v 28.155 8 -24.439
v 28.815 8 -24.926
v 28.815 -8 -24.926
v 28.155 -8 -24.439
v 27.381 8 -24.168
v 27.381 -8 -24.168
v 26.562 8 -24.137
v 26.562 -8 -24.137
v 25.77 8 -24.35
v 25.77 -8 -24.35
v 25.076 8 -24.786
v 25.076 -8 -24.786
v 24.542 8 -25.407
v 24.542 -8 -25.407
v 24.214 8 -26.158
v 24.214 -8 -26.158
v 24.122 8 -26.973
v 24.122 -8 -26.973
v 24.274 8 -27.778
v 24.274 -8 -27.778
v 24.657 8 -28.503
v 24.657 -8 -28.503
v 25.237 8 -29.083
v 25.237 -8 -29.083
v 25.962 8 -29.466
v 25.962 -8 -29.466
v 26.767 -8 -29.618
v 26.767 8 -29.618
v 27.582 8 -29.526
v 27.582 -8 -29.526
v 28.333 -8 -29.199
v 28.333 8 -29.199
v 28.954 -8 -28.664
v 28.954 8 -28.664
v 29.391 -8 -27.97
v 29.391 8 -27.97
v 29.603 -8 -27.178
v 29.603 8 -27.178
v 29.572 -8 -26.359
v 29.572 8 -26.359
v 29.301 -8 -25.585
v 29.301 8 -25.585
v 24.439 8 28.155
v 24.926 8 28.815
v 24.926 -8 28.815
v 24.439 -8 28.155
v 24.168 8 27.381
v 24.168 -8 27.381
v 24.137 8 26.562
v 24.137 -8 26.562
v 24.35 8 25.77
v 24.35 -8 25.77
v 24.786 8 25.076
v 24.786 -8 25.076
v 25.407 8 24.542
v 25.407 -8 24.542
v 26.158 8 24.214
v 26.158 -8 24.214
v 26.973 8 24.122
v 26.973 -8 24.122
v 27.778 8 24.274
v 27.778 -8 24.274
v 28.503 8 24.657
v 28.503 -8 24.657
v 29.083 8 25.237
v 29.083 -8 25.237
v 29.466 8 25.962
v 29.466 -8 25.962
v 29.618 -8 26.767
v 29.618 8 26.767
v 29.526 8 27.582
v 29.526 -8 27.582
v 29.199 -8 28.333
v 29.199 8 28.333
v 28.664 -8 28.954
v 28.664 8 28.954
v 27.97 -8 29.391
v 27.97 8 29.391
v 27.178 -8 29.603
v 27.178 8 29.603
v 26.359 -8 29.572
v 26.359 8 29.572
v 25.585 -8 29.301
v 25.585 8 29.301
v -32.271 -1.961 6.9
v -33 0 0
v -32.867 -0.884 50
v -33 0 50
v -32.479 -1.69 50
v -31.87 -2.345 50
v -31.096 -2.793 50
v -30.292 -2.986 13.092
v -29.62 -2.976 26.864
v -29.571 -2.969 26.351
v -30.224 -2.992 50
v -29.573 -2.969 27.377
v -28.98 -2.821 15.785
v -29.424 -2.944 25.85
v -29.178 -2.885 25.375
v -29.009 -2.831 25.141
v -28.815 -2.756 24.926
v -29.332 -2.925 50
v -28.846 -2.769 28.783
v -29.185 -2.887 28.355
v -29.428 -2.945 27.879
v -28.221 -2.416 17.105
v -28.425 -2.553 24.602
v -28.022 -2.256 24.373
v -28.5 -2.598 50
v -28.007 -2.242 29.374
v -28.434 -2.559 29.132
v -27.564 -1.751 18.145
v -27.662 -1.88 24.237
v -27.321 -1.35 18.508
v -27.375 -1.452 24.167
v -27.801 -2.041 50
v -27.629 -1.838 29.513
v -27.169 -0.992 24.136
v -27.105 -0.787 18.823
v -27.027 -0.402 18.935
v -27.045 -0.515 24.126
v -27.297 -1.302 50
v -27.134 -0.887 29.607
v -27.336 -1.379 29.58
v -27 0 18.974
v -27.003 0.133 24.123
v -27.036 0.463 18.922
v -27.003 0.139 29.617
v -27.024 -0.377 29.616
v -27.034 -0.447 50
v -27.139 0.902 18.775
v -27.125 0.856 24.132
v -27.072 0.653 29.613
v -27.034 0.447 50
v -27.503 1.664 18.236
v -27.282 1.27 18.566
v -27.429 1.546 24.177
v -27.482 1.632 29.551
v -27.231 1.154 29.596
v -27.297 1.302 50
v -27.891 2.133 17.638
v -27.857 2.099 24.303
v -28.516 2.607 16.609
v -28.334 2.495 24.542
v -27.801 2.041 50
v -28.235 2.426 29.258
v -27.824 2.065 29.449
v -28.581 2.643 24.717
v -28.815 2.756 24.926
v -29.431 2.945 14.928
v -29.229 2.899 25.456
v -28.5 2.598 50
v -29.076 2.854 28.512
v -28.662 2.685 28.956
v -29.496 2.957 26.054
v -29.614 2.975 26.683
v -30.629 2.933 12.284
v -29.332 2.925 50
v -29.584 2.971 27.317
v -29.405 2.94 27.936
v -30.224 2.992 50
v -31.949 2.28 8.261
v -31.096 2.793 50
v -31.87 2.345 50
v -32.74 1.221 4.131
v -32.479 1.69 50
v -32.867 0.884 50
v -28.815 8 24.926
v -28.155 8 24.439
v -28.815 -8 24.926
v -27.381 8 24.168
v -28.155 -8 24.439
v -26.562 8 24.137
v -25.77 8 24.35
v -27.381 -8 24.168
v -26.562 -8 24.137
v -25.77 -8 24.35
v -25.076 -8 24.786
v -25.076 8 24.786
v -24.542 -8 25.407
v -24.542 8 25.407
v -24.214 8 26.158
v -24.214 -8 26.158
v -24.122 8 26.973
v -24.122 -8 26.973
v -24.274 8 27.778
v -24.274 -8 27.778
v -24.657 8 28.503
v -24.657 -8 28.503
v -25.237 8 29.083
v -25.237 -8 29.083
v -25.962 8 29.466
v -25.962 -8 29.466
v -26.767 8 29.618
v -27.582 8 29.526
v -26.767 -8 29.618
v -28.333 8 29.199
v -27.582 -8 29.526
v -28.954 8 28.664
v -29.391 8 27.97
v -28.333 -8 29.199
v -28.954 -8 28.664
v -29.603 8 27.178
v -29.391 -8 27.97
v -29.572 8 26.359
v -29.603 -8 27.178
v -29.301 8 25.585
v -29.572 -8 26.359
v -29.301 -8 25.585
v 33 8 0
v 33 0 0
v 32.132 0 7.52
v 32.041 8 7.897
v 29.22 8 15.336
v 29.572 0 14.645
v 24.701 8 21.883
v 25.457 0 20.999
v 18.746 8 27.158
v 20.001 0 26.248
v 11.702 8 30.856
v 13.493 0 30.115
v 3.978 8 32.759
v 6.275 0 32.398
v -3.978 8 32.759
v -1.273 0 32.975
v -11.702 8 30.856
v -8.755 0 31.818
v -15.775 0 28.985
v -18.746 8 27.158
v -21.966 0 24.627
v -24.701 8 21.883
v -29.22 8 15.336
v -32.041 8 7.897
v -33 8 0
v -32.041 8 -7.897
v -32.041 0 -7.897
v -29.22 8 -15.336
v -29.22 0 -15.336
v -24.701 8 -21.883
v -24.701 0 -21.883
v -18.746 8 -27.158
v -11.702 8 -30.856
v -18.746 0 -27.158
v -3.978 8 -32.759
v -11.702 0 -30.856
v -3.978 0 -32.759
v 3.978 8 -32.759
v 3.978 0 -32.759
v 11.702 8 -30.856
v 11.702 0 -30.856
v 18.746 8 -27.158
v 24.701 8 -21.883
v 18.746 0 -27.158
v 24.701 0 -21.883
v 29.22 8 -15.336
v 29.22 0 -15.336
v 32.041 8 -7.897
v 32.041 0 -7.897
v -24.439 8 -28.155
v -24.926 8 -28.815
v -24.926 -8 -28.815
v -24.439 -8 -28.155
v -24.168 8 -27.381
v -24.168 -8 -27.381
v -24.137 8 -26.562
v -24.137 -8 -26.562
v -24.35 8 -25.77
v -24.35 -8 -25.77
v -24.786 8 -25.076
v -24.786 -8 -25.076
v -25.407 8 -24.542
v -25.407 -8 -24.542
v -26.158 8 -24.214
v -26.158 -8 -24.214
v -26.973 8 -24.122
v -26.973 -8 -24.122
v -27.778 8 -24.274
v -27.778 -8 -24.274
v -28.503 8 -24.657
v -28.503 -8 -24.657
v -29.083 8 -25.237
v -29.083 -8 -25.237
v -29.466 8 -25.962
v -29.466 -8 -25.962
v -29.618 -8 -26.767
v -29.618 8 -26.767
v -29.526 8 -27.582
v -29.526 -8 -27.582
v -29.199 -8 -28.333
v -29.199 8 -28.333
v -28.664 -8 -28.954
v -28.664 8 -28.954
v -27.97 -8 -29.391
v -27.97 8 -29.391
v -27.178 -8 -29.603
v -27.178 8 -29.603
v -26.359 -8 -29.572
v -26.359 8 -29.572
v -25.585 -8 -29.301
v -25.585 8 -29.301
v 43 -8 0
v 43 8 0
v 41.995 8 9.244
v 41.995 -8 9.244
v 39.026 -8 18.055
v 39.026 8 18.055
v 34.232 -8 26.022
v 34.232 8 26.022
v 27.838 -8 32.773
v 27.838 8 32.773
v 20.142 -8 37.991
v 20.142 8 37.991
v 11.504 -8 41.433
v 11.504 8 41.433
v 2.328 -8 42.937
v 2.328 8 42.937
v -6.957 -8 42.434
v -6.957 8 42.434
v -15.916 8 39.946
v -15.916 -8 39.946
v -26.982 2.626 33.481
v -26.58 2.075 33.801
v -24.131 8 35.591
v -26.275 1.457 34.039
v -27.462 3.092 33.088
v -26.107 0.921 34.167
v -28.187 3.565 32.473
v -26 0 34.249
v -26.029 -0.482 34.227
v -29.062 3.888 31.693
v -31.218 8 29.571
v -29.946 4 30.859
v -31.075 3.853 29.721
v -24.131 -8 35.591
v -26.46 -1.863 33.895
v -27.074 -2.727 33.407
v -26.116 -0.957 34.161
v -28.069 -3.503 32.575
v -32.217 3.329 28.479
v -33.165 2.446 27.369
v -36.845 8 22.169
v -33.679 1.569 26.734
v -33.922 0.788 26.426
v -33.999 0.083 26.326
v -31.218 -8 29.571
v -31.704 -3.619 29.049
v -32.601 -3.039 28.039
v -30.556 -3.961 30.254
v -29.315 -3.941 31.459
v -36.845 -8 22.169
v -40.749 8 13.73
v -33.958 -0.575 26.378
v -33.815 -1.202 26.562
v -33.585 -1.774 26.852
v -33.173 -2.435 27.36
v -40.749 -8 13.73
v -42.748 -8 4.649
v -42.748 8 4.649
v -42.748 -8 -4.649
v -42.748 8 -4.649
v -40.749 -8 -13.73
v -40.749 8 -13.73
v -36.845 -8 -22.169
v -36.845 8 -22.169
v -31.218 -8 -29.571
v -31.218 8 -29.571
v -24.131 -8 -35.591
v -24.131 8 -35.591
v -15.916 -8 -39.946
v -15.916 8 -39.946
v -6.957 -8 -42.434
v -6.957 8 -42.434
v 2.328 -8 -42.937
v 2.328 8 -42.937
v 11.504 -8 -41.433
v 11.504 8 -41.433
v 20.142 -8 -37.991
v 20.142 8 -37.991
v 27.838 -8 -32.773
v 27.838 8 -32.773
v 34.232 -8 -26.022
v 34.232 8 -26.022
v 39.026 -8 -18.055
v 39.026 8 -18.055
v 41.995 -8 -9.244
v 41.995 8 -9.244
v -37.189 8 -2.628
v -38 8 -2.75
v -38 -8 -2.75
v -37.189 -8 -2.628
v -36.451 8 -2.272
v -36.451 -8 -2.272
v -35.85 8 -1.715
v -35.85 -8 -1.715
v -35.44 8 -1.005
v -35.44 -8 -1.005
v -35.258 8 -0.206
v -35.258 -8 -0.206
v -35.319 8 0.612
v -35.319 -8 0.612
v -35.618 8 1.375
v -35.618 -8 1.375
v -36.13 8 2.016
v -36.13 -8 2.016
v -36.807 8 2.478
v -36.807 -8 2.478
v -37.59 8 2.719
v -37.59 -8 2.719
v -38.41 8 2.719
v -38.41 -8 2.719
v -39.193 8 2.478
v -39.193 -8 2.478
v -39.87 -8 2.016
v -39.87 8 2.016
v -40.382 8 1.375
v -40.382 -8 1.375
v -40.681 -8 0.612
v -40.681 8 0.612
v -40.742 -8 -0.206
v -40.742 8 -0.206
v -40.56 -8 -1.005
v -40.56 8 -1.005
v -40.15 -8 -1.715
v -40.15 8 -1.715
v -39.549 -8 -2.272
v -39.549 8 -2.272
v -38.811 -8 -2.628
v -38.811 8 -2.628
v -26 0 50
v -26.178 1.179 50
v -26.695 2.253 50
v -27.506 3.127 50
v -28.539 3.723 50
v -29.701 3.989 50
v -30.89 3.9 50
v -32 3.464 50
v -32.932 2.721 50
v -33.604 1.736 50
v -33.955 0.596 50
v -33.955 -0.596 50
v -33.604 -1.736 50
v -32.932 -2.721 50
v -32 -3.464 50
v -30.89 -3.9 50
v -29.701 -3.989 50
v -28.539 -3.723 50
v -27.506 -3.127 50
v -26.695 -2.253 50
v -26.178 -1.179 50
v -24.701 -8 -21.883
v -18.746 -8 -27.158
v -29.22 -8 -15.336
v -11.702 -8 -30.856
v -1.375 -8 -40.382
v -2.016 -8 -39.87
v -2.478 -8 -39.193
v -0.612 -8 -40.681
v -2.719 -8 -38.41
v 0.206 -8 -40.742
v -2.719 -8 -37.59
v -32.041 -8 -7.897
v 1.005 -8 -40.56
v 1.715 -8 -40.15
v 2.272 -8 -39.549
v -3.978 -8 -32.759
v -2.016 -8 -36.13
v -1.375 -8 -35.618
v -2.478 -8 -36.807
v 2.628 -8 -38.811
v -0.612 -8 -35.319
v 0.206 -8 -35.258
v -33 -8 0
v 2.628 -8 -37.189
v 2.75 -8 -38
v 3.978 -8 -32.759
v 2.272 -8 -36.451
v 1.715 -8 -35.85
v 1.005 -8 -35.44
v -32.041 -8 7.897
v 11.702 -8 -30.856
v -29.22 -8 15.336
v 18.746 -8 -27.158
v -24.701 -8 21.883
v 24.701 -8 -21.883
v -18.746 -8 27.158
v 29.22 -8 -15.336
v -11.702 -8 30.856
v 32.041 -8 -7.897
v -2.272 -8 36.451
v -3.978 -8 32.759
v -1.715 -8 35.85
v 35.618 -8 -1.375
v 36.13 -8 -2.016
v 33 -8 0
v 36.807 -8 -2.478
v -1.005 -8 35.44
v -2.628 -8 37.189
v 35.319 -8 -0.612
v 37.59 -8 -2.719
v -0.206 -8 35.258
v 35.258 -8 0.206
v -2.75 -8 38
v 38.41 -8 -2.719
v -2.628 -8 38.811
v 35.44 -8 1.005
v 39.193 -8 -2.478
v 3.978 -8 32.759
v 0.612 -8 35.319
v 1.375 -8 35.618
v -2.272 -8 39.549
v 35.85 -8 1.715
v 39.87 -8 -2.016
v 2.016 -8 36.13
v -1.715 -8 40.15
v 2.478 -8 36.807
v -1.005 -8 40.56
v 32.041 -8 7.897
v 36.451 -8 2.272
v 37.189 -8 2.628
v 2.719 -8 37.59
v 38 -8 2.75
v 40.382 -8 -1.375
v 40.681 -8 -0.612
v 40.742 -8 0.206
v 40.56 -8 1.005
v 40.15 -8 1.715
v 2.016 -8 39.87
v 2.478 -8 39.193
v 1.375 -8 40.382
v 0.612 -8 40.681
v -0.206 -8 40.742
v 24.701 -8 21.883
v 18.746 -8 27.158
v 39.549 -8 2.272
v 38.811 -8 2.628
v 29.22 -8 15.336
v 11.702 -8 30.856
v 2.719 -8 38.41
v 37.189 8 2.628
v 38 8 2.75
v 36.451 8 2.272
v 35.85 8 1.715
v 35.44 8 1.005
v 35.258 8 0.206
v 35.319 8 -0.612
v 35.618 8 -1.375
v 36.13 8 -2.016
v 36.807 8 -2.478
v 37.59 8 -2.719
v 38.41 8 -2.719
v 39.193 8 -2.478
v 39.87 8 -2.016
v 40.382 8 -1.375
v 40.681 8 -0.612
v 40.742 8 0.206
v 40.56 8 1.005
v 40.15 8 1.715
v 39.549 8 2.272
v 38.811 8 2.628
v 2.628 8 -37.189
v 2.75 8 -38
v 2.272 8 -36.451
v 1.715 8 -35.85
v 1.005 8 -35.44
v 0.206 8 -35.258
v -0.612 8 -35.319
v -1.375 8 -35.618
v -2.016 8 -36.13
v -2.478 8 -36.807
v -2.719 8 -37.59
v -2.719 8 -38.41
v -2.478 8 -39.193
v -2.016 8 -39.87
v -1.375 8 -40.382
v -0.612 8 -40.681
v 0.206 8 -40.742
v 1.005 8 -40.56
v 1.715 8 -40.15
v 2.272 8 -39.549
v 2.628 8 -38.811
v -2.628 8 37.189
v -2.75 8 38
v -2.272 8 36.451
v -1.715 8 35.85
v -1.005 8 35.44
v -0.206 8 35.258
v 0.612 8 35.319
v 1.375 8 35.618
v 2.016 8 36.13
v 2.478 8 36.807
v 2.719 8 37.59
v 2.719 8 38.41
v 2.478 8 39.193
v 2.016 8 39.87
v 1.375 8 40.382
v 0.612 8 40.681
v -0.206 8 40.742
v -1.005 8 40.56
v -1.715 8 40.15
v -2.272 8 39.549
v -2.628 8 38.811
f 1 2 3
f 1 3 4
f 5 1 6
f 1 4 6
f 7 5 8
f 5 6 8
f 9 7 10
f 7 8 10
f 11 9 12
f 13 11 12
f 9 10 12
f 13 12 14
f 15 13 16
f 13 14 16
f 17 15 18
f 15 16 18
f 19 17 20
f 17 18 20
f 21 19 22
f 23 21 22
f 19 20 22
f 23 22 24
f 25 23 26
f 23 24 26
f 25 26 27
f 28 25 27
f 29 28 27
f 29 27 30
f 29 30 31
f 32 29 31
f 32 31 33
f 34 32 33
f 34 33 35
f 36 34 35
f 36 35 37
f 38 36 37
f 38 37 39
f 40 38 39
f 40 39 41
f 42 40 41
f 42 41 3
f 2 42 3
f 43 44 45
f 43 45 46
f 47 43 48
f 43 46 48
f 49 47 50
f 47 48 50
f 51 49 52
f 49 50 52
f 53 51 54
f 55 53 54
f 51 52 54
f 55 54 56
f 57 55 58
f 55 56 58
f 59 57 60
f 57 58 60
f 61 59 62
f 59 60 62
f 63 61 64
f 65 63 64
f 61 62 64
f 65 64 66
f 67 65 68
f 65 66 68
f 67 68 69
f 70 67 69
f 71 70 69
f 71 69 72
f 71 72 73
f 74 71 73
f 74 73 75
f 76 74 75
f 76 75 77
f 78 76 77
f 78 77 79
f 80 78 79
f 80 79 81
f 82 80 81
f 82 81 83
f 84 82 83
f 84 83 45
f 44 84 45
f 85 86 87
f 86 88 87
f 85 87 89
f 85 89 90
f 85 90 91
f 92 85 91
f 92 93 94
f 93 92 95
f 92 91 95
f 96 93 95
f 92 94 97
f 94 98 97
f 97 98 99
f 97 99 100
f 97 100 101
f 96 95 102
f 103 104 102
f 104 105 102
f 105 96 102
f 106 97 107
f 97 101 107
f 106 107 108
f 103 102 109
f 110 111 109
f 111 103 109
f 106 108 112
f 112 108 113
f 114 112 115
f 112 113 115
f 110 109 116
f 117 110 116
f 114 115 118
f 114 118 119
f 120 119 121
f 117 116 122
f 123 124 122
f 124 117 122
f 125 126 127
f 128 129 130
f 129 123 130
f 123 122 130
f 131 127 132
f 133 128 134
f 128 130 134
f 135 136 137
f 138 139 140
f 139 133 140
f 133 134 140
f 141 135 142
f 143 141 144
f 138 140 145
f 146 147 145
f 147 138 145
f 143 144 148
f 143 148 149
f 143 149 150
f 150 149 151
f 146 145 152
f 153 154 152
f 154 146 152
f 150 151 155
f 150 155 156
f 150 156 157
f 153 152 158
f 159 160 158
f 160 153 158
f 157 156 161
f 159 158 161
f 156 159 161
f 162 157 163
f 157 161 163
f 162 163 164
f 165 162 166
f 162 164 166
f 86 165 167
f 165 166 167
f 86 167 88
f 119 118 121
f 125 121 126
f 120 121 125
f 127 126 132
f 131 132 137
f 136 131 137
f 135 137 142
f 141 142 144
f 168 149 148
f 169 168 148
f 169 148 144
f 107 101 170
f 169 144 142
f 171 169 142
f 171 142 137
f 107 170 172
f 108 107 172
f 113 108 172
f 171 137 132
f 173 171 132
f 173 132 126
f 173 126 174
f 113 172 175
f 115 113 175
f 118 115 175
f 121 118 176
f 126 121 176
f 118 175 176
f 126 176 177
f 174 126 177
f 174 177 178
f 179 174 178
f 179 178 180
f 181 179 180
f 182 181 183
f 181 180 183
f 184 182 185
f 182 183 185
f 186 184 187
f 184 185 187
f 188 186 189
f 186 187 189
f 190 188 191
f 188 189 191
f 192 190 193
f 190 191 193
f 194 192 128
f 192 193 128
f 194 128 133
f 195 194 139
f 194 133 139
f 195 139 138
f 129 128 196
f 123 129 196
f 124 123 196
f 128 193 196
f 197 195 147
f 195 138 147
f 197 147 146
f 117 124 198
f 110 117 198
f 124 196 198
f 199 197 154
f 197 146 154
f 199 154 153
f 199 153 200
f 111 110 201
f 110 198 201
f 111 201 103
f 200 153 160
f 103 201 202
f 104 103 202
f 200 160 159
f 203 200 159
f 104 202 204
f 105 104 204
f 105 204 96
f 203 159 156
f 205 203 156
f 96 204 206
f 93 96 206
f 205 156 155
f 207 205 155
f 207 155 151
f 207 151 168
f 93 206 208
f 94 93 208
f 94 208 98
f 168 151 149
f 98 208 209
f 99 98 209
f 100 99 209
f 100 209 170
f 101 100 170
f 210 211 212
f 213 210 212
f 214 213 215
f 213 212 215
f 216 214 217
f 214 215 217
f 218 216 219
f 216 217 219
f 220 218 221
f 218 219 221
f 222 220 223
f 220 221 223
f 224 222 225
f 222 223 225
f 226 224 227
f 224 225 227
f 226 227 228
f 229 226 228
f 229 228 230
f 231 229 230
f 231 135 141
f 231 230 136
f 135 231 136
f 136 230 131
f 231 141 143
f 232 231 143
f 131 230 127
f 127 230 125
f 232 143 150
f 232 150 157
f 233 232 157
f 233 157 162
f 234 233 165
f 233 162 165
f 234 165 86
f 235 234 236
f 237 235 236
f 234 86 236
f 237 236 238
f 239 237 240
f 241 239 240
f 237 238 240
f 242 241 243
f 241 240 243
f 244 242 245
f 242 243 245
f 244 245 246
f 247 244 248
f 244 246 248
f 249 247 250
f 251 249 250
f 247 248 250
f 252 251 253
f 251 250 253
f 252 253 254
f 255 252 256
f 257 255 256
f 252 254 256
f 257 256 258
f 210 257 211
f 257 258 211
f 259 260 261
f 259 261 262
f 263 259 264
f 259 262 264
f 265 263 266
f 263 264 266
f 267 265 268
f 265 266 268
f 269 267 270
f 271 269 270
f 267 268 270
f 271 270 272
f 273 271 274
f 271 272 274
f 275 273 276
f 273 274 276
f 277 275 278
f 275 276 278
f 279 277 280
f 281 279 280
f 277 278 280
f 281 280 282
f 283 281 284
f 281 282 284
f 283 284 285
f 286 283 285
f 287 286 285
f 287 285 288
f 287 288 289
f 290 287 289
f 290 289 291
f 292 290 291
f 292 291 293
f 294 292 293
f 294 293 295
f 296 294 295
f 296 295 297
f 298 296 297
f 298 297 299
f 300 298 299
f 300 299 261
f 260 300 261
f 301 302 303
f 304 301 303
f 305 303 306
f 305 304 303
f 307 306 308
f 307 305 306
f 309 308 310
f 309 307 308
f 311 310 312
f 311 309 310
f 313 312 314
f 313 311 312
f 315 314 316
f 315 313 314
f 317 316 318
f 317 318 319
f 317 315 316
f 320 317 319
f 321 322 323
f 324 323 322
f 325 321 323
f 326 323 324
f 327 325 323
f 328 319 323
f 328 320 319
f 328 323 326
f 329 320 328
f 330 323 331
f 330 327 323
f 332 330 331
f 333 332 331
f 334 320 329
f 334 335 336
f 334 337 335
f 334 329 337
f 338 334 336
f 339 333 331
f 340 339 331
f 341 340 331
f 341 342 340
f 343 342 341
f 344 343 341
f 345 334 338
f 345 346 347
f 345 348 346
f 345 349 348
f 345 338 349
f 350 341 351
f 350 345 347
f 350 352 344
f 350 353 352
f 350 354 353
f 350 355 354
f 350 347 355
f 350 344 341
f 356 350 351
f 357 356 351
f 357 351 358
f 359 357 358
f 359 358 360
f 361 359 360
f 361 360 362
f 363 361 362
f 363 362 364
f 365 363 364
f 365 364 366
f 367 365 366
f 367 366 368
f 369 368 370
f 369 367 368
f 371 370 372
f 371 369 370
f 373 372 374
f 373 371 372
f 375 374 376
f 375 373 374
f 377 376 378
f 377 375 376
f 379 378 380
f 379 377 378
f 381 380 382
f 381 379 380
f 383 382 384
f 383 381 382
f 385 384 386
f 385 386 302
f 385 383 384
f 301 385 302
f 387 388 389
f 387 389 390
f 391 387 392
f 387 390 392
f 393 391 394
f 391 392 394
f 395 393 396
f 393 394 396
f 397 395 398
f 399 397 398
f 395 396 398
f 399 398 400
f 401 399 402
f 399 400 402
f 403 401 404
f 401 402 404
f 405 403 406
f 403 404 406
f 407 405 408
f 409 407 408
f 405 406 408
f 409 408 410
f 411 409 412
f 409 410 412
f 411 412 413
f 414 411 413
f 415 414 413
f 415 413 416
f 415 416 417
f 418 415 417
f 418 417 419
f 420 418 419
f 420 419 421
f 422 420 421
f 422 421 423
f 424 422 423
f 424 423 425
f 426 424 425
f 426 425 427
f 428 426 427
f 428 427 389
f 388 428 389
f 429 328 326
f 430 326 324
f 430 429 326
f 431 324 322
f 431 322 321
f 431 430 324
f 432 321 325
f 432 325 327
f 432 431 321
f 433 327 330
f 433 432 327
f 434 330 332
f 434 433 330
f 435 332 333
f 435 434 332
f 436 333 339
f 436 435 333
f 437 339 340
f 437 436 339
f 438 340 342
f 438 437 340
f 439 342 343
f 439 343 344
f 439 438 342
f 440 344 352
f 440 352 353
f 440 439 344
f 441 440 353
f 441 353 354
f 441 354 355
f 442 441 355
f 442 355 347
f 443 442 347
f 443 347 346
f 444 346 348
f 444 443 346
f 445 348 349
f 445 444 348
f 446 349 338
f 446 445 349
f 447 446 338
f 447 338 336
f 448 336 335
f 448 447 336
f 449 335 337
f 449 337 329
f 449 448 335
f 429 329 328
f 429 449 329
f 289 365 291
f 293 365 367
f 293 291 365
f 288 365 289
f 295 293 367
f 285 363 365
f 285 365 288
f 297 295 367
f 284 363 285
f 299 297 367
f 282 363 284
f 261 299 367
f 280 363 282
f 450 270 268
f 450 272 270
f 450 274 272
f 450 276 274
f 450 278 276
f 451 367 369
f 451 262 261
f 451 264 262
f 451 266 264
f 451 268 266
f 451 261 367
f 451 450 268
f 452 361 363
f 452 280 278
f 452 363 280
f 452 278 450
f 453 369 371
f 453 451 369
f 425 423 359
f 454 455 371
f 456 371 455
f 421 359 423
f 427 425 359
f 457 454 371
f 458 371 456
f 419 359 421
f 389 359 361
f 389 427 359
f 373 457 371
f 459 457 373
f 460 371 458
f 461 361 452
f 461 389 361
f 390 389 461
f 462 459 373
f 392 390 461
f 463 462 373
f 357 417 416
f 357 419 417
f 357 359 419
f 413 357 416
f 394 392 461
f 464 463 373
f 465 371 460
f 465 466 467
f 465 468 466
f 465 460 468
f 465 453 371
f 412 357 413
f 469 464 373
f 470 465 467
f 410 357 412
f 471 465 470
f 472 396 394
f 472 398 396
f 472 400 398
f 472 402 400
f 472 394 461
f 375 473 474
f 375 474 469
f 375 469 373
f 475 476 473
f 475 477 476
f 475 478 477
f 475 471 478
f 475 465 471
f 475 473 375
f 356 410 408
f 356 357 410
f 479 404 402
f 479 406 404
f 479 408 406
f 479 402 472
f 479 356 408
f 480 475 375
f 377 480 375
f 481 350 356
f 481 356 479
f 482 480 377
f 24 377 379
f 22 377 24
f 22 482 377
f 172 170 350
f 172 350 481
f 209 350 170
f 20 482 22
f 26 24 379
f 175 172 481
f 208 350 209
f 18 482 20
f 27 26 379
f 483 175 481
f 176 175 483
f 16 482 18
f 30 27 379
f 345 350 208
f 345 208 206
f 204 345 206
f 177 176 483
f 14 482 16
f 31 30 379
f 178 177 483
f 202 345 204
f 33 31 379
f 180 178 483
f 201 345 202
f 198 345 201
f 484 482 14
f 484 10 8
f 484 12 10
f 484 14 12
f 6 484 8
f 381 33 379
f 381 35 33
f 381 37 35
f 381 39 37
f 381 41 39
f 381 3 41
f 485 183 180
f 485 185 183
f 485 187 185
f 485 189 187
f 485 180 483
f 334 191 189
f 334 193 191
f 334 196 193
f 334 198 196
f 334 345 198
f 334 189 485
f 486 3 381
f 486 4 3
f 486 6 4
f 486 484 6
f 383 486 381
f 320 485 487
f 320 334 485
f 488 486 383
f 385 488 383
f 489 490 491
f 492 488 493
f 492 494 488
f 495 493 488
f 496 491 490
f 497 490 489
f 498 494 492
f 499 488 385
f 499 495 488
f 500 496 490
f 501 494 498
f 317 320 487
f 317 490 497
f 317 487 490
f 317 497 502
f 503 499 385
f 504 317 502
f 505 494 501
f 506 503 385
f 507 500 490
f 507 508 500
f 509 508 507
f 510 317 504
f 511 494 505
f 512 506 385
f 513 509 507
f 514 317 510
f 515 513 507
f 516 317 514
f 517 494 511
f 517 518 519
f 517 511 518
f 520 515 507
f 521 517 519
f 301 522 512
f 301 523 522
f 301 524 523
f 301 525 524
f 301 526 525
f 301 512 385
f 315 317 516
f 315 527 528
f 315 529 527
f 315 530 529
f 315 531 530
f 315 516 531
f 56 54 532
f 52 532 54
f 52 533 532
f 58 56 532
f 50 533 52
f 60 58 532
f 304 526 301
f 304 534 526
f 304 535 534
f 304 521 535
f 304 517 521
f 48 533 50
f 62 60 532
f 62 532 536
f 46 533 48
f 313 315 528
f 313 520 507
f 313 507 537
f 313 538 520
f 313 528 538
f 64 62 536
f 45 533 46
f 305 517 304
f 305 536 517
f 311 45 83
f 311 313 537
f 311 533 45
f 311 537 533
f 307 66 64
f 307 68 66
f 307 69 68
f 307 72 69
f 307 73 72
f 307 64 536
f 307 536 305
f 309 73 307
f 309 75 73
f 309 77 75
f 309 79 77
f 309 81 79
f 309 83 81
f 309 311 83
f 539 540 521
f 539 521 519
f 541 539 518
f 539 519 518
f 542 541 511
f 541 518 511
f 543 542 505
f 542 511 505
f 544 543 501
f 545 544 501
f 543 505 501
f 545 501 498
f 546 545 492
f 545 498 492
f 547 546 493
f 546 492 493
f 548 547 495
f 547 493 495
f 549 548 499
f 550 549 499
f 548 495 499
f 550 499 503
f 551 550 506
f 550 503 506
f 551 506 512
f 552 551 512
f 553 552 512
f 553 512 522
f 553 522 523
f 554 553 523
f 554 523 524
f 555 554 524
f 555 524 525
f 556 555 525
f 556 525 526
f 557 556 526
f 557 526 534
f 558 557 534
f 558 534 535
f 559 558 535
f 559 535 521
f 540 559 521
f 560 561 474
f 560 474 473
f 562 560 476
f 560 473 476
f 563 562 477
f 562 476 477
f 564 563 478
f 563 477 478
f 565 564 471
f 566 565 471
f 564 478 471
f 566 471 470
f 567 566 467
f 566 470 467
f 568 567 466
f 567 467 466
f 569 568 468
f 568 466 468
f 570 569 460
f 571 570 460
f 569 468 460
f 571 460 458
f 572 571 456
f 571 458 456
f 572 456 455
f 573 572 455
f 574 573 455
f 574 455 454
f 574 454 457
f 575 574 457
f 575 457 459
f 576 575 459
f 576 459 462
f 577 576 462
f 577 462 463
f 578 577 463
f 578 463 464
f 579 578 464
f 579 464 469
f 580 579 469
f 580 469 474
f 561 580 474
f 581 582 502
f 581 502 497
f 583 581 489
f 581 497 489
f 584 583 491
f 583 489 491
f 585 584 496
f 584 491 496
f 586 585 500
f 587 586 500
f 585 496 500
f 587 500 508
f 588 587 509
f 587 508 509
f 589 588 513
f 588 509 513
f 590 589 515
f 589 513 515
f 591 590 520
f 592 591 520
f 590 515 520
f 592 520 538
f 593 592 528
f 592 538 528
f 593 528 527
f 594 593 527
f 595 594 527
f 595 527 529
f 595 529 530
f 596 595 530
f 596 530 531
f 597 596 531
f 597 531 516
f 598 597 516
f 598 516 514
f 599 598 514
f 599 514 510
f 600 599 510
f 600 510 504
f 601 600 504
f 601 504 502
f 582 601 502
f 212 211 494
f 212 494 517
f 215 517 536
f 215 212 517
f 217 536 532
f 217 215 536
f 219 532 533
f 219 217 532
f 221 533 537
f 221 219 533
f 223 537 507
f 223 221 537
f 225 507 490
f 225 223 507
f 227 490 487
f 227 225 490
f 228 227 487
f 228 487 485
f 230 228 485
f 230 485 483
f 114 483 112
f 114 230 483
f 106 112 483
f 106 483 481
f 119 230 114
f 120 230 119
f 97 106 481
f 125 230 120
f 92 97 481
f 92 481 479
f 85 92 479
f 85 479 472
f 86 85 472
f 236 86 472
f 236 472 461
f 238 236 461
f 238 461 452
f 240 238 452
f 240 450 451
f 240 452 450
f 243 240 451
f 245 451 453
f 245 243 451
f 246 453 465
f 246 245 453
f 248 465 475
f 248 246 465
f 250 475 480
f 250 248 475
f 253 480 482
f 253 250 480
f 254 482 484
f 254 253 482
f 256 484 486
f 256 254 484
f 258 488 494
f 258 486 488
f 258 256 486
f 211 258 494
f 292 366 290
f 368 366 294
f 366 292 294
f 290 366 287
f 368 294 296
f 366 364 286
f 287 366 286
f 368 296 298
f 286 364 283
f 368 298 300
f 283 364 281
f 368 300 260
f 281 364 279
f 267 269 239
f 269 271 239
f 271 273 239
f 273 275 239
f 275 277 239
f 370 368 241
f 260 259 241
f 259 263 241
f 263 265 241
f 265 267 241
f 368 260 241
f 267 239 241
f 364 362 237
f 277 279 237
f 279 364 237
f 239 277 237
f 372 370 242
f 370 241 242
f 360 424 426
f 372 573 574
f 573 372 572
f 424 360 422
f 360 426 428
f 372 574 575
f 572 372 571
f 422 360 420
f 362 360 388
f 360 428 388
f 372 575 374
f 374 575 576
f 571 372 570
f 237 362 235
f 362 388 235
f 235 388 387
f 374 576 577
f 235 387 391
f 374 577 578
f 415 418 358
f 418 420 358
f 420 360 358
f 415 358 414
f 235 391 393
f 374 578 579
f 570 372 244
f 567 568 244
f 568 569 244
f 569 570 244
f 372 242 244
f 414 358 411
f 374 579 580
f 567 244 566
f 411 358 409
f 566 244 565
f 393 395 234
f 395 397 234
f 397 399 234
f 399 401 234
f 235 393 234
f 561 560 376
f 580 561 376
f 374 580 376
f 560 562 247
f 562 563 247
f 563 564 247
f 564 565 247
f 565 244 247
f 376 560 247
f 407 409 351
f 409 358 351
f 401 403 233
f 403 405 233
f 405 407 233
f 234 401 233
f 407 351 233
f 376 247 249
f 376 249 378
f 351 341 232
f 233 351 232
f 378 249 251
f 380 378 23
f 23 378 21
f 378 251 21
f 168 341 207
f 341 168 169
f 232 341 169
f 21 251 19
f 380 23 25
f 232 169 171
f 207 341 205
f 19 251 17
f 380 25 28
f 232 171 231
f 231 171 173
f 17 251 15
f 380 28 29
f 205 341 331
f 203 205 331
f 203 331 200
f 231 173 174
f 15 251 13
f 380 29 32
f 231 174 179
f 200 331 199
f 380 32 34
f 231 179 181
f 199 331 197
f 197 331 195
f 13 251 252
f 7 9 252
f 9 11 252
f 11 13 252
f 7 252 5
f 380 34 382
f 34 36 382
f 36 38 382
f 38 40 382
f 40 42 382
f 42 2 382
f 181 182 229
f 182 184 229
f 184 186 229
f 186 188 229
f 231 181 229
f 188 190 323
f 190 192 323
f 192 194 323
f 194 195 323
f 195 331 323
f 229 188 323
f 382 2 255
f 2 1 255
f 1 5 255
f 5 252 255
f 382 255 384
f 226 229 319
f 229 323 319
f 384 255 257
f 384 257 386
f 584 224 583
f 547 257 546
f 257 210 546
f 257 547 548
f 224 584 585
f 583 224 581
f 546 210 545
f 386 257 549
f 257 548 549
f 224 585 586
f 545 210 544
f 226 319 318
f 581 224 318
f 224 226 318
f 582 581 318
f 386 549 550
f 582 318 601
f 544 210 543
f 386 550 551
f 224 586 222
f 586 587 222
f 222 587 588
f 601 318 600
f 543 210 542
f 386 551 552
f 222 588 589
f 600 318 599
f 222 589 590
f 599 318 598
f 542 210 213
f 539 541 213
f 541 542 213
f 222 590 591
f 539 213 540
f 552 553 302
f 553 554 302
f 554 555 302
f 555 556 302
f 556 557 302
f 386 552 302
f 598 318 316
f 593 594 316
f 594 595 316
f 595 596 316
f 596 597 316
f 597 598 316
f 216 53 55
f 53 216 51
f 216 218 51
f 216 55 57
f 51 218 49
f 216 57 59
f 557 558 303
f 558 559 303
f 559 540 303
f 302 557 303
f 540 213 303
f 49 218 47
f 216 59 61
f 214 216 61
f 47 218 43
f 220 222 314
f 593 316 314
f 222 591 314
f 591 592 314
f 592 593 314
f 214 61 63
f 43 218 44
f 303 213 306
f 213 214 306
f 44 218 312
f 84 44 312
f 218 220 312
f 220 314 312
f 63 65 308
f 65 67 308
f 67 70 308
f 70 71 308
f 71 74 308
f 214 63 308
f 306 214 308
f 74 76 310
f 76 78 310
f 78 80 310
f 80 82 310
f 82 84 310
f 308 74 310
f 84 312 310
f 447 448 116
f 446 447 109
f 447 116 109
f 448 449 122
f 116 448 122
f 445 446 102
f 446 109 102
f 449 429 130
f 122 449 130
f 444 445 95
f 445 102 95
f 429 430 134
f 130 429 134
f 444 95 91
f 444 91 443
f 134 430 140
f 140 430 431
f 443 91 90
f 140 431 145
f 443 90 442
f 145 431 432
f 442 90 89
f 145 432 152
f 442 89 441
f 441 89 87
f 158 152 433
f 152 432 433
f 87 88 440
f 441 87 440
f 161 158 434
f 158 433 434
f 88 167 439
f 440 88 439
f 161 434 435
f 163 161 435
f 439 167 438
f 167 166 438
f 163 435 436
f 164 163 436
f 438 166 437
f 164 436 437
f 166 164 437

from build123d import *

# Parameters (mm, degrees)
SKETCH001_R           = 43
PAD_DEPTH             = 8
SKETCH002_W           = 4
SKETCH002_H           = 50
SKETCH003_R           = 33
POCKET_DEPTH          = 8.001
POCKET_DEPTH_BACK     = 8.001
SKETCH004_W           = 3
SKETCH004_H           = 50
SKETCH013_R           = 2.75
POCKET005_DEPTH       = 271.35174
POLARPATTERN003_COUNT = 8


with BuildPart() as part:
    # Sketch001 → Pad (new body, symmetric)
    with BuildSketch(Plane.XZ):
        Circle(SKETCH001_R)
    extrude(amount=PAD_DEPTH, both=True)

    # Sketch002 → Revolution (revolve)
    with BuildSketch(Plane.XZ):
        with Locations((-28, 25)):
            Rectangle(SKETCH002_W, SKETCH002_H)
    revolve(axis=Axis((-30, 0, 40.402922), (0, 0, 1)))

    # Sketch003 → Pocket (cut, two sides)
    with BuildSketch(Plane.XZ) as pocket_sk:
        Circle(SKETCH003_R)
    extrude(amount=-POCKET_DEPTH, mode=Mode.SUBTRACT)
    extrude(pocket_sk.sketch, amount=POCKET_DEPTH_BACK, mode=Mode.SUBTRACT)

    # Sketch004 → Groove (revolve, cut)
    with BuildSketch(Plane.XZ):
        with Locations((-31.5, 25)):
            Rectangle(SKETCH004_W, SKETCH004_H)
    revolve(axis=Axis((-30, 0, 22.276785), (0, 0, 1)), mode=Mode.SUBTRACT)

    # Sketch013 (on Face4 of Groove) → Pocket005 (cut, through all)
    with BuildSketch(Plane.XZ.offset(8)):
        with Locations((0, -38)):
            Circle(SKETCH013_R)
    pocket005 = extrude(amount=-POCKET005_DEPTH, mode=Mode.SUBTRACT)

    # PolarPattern003: Pocket005 ×8 about axis
    polarpattern003_axis = Axis((0, -8, 0), (0, -1, 0))
    for i in range(1, POLARPATTERN003_COUNT):
        add(pocket005.rotate(polarpattern003_axis, i * 360 / POLARPATTERN003_COUNT), mode=Mode.SUBTRACT)


solid = part.part
